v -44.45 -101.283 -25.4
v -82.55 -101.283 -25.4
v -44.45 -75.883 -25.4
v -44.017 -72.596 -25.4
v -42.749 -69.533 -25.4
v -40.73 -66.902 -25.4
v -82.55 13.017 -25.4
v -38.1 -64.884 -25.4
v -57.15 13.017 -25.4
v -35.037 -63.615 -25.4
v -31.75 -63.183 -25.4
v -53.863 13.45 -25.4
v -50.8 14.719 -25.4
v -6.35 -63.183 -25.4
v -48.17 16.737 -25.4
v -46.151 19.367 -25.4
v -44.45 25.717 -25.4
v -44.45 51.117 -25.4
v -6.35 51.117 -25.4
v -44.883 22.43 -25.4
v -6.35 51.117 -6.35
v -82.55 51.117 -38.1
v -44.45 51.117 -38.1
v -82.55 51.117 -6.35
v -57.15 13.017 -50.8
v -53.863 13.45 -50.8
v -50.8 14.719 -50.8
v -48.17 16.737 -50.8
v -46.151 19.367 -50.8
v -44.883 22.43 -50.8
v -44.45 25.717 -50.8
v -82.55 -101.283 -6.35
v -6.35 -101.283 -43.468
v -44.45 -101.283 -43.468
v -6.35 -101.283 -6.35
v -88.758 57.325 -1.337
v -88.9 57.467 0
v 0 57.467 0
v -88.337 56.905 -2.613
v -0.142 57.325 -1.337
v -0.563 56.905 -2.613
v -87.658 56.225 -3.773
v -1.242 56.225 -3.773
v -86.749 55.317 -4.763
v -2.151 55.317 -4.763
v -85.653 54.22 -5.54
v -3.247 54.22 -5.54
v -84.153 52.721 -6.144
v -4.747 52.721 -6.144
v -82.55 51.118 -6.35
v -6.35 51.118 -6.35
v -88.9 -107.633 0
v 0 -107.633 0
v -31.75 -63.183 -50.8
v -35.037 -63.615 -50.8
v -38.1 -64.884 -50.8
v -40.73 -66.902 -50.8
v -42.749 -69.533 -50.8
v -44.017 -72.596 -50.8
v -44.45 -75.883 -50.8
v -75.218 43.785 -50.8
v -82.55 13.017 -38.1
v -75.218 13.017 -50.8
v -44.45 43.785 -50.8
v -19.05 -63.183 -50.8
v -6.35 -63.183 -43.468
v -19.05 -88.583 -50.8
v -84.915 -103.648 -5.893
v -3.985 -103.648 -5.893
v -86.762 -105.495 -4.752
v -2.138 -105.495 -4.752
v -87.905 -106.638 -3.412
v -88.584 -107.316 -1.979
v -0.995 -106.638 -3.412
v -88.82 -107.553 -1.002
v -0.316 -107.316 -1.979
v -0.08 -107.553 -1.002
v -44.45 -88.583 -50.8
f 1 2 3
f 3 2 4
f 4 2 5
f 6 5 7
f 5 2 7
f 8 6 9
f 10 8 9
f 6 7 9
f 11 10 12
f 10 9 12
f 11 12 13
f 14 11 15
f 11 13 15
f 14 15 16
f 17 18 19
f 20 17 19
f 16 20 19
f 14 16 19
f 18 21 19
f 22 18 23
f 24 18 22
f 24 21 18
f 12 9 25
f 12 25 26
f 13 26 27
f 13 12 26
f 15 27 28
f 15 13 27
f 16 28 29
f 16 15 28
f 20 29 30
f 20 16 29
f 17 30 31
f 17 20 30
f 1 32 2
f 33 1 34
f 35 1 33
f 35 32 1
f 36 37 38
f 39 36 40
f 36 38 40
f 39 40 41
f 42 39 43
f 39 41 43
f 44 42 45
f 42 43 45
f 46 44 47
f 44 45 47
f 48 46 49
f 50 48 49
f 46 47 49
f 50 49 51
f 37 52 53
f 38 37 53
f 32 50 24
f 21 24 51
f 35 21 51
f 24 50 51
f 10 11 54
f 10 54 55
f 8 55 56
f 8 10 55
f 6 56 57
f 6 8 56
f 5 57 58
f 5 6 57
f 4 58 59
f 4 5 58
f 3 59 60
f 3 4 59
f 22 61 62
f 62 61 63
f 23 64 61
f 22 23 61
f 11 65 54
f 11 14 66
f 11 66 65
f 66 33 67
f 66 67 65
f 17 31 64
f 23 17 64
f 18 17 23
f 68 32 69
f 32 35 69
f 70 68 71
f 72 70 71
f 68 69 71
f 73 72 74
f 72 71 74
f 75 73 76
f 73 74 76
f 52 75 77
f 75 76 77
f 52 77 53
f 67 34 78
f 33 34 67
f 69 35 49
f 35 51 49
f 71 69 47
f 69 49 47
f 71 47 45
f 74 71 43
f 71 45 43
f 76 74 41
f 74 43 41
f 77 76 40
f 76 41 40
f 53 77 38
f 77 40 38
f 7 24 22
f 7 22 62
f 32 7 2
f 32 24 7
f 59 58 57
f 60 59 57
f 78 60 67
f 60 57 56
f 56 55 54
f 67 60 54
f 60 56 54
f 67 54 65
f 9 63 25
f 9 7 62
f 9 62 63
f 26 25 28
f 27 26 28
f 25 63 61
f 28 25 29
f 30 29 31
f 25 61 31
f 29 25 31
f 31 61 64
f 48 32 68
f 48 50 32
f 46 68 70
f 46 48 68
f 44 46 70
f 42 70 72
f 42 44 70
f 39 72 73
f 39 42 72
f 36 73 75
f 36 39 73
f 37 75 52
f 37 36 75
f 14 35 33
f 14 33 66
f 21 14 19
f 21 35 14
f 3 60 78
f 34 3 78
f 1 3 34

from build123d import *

# Parameters (mm, degrees)
F0_W     = 88.9
F0_H     = 165.1
F1_DEPTH = 6.35
F2_DEPTH = 25.4
F3_DEPTH = 50.8
F4_R     = 6.34999
F5_SIZE2 = 7.3323484187
F5_SIZE  = 12.7
F6_SIZE2 = 7.3323484187
F6_SIZE  = 12.7


# Not quite as in the source:
# - a fillet or chamfer is up to 0.001 mm smaller than in the source, because OpenCascade refuses the exact size


with BuildPart() as f1:
    # F0 (on Top) → F1 (new body)
    with BuildSketch(Plane.XY):
        with Locations((-44.4500000971, -25.0825021148)):
            Rectangle(F0_W, F0_H)
        Polygon((-82.5500000971, 13.0174978852), (-82.5500000971, 51.1174978852), (-44.4500000971, 51.1174978852), (-6.3500000971, 51.1174978852), (-6.3500000971, -63.1825021148), (-6.3500000971, -101.2825021148), (-44.4500000971, -101.2825021148), (-82.5500000971, -101.2825021148), align=None, mode=Mode.SUBTRACT)
        with BuildLine():
            Line((-6.3500000971, 51.1174978852), (-44.4500000971, 51.1174978852))
            Line((-44.4500000971, 51.1174978852), (-44.4500000971, 25.7174978852))
            ThreePointArc((-44.4500000971, 25.7174978852), (-48.169743976, 16.7372417642), (-57.1500000971, 13.0174978852))
            Line((-57.1500000971, 13.0174978852), (-82.5500000971, 13.0174978852))
            Line((-82.5500000971, 13.0174978852), (-82.5500000971, -101.2825021148))
            Line((-82.5500000971, -101.2825021148), (-44.4500000971, -101.2825021148))
            Line((-44.4500000971, -101.2825021148), (-44.4500000971, -75.8825021148))
            ThreePointArc((-44.4500000971, -75.8825021148), (-40.7302562182, -66.9022459937), (-31.7500000971, -63.1825021148))
            Line((-31.7500000971, -63.1825021148), (-6.3500000971, -63.1825021148))
            Line((-6.3500000971, -63.1825021148), (-6.3500000971, 51.1174978852))
        make_face()
        with BuildLine():
            Line((-6.3500000971, -101.2825021148), (-6.3500000971, -63.1825021148))
            Line((-6.3500000971, -63.1825021148), (-31.7500000971, -63.1825021148))
            ThreePointArc((-31.7500000971, -63.1825021148), (-40.7302562182, -66.9022459937), (-44.4500000971, -75.8825021148))
            Line((-44.4500000971, -75.8825021148), (-44.4500000971, -101.2825021148))
            Line((-44.4500000971, -101.2825021148), (-6.3500000971, -101.2825021148))
        make_face()
        with BuildLine():
            Line((-44.4500000971, 51.1174978852), (-82.5500000971, 51.1174978852))
            Line((-82.5500000971, 51.1174978852), (-82.5500000971, 13.0174978852))
            Line((-82.5500000971, 13.0174978852), (-57.1500000971, 13.0174978852))
            ThreePointArc((-57.1500000971, 13.0174978852), (-48.169743976, 16.7372417642), (-44.4500000971, 25.7174978852))
            Line((-44.4500000971, 25.7174978852), (-44.4500000971, 51.1174978852))
        make_face()
    extrude(amount=-F1_DEPTH)

    # F0 (on Top) → F2 (join)
    with BuildSketch(Plane.XY):
        with BuildLine():
            Line((-6.3500000971, 51.1174978852), (-44.4500000971, 51.1174978852))
            Line((-44.4500000971, 51.1174978852), (-44.4500000971, 25.7174978852))
            ThreePointArc((-44.4500000971, 25.7174978852), (-48.169743976, 16.7372417642), (-57.1500000971, 13.0174978852))
            Line((-57.1500000971, 13.0174978852), (-82.5500000971, 13.0174978852))
            Line((-82.5500000971, 13.0174978852), (-82.5500000971, -101.2825021148))
            Line((-82.5500000971, -101.2825021148), (-44.4500000971, -101.2825021148))
            Line((-44.4500000971, -101.2825021148), (-44.4500000971, -75.8825021148))
            ThreePointArc((-44.4500000971, -75.8825021148), (-40.7302562182, -66.9022459937), (-31.7500000971, -63.1825021148))
            Line((-31.7500000971, -63.1825021148), (-6.3500000971, -63.1825021148))
            Line((-6.3500000971, -63.1825021148), (-6.3500000971, 51.1174978852))
        make_face()
    extrude(amount=-F2_DEPTH)

    # F0 (on Top) → F3 (join)
    with BuildSketch(Plane.XY):
        with BuildLine():
            Line((-6.3500000971, -101.2825021148), (-6.3500000971, -63.1825021148))
            Line((-6.3500000971, -63.1825021148), (-31.7500000971, -63.1825021148))
            ThreePointArc((-31.7500000971, -63.1825021148), (-40.7302562182, -66.9022459937), (-44.4500000971, -75.8825021148))
            Line((-44.4500000971, -75.8825021148), (-44.4500000971, -101.2825021148))
            Line((-44.4500000971, -101.2825021148), (-6.3500000971, -101.2825021148))
        make_face()
        with BuildLine():
            Line((-44.4500000971, 51.1174978852), (-82.5500000971, 51.1174978852))
            Line((-82.5500000971, 51.1174978852), (-82.5500000971, 13.0174978852))
            Line((-82.5500000971, 13.0174978852), (-57.1500000971, 13.0174978852))
            ThreePointArc((-57.1500000971, 13.0174978852), (-48.169743976, 16.7372417642), (-44.4500000971, 25.7174978852))
            Line((-44.4500000971, 25.7174978852), (-44.4500000971, 51.1174978852))
        make_face()
    extrude(amount=-F3_DEPTH)

    # F4 (radius 6.35 in the source; OpenCascade refuses exactly that, so slightly less here)
    f4_edges = [f1.edges().sort_by_distance(p)[0] for p in [
        (-44.45, 57.467498, -6.35),
        (0, -25.082502, -6.35),
        (-44.45, -107.632502, -6.35),
        (-88.9, -25.082502, -6.35),
    ]]
    fillet(f4_edges, radius=F4_R)

    # F5
    f5_edges = [f1.edges().sort_by_distance(p)[0] for p in [
        (-6.35, -82.232502, -50.8),
        (-25.4, -101.282502, -50.8),
    ]]
    f5_side = f1.faces().sort_by_distance((-25.003958, -82.628544, -50.8))[0]
    chamfer(f5_edges, length=F5_SIZE, length2=F5_SIZE2, reference=f5_side)

    # F6
    f6_edges = [f1.edges().sort_by_distance(p)[0] for p in [
        (-82.55, 32.067498, -50.8),
        (-63.5, 51.117498, -50.8),
    ]]
    chamfer(f6_edges, length=F6_SIZE, length2=F6_SIZE2)


solid = f1.part
